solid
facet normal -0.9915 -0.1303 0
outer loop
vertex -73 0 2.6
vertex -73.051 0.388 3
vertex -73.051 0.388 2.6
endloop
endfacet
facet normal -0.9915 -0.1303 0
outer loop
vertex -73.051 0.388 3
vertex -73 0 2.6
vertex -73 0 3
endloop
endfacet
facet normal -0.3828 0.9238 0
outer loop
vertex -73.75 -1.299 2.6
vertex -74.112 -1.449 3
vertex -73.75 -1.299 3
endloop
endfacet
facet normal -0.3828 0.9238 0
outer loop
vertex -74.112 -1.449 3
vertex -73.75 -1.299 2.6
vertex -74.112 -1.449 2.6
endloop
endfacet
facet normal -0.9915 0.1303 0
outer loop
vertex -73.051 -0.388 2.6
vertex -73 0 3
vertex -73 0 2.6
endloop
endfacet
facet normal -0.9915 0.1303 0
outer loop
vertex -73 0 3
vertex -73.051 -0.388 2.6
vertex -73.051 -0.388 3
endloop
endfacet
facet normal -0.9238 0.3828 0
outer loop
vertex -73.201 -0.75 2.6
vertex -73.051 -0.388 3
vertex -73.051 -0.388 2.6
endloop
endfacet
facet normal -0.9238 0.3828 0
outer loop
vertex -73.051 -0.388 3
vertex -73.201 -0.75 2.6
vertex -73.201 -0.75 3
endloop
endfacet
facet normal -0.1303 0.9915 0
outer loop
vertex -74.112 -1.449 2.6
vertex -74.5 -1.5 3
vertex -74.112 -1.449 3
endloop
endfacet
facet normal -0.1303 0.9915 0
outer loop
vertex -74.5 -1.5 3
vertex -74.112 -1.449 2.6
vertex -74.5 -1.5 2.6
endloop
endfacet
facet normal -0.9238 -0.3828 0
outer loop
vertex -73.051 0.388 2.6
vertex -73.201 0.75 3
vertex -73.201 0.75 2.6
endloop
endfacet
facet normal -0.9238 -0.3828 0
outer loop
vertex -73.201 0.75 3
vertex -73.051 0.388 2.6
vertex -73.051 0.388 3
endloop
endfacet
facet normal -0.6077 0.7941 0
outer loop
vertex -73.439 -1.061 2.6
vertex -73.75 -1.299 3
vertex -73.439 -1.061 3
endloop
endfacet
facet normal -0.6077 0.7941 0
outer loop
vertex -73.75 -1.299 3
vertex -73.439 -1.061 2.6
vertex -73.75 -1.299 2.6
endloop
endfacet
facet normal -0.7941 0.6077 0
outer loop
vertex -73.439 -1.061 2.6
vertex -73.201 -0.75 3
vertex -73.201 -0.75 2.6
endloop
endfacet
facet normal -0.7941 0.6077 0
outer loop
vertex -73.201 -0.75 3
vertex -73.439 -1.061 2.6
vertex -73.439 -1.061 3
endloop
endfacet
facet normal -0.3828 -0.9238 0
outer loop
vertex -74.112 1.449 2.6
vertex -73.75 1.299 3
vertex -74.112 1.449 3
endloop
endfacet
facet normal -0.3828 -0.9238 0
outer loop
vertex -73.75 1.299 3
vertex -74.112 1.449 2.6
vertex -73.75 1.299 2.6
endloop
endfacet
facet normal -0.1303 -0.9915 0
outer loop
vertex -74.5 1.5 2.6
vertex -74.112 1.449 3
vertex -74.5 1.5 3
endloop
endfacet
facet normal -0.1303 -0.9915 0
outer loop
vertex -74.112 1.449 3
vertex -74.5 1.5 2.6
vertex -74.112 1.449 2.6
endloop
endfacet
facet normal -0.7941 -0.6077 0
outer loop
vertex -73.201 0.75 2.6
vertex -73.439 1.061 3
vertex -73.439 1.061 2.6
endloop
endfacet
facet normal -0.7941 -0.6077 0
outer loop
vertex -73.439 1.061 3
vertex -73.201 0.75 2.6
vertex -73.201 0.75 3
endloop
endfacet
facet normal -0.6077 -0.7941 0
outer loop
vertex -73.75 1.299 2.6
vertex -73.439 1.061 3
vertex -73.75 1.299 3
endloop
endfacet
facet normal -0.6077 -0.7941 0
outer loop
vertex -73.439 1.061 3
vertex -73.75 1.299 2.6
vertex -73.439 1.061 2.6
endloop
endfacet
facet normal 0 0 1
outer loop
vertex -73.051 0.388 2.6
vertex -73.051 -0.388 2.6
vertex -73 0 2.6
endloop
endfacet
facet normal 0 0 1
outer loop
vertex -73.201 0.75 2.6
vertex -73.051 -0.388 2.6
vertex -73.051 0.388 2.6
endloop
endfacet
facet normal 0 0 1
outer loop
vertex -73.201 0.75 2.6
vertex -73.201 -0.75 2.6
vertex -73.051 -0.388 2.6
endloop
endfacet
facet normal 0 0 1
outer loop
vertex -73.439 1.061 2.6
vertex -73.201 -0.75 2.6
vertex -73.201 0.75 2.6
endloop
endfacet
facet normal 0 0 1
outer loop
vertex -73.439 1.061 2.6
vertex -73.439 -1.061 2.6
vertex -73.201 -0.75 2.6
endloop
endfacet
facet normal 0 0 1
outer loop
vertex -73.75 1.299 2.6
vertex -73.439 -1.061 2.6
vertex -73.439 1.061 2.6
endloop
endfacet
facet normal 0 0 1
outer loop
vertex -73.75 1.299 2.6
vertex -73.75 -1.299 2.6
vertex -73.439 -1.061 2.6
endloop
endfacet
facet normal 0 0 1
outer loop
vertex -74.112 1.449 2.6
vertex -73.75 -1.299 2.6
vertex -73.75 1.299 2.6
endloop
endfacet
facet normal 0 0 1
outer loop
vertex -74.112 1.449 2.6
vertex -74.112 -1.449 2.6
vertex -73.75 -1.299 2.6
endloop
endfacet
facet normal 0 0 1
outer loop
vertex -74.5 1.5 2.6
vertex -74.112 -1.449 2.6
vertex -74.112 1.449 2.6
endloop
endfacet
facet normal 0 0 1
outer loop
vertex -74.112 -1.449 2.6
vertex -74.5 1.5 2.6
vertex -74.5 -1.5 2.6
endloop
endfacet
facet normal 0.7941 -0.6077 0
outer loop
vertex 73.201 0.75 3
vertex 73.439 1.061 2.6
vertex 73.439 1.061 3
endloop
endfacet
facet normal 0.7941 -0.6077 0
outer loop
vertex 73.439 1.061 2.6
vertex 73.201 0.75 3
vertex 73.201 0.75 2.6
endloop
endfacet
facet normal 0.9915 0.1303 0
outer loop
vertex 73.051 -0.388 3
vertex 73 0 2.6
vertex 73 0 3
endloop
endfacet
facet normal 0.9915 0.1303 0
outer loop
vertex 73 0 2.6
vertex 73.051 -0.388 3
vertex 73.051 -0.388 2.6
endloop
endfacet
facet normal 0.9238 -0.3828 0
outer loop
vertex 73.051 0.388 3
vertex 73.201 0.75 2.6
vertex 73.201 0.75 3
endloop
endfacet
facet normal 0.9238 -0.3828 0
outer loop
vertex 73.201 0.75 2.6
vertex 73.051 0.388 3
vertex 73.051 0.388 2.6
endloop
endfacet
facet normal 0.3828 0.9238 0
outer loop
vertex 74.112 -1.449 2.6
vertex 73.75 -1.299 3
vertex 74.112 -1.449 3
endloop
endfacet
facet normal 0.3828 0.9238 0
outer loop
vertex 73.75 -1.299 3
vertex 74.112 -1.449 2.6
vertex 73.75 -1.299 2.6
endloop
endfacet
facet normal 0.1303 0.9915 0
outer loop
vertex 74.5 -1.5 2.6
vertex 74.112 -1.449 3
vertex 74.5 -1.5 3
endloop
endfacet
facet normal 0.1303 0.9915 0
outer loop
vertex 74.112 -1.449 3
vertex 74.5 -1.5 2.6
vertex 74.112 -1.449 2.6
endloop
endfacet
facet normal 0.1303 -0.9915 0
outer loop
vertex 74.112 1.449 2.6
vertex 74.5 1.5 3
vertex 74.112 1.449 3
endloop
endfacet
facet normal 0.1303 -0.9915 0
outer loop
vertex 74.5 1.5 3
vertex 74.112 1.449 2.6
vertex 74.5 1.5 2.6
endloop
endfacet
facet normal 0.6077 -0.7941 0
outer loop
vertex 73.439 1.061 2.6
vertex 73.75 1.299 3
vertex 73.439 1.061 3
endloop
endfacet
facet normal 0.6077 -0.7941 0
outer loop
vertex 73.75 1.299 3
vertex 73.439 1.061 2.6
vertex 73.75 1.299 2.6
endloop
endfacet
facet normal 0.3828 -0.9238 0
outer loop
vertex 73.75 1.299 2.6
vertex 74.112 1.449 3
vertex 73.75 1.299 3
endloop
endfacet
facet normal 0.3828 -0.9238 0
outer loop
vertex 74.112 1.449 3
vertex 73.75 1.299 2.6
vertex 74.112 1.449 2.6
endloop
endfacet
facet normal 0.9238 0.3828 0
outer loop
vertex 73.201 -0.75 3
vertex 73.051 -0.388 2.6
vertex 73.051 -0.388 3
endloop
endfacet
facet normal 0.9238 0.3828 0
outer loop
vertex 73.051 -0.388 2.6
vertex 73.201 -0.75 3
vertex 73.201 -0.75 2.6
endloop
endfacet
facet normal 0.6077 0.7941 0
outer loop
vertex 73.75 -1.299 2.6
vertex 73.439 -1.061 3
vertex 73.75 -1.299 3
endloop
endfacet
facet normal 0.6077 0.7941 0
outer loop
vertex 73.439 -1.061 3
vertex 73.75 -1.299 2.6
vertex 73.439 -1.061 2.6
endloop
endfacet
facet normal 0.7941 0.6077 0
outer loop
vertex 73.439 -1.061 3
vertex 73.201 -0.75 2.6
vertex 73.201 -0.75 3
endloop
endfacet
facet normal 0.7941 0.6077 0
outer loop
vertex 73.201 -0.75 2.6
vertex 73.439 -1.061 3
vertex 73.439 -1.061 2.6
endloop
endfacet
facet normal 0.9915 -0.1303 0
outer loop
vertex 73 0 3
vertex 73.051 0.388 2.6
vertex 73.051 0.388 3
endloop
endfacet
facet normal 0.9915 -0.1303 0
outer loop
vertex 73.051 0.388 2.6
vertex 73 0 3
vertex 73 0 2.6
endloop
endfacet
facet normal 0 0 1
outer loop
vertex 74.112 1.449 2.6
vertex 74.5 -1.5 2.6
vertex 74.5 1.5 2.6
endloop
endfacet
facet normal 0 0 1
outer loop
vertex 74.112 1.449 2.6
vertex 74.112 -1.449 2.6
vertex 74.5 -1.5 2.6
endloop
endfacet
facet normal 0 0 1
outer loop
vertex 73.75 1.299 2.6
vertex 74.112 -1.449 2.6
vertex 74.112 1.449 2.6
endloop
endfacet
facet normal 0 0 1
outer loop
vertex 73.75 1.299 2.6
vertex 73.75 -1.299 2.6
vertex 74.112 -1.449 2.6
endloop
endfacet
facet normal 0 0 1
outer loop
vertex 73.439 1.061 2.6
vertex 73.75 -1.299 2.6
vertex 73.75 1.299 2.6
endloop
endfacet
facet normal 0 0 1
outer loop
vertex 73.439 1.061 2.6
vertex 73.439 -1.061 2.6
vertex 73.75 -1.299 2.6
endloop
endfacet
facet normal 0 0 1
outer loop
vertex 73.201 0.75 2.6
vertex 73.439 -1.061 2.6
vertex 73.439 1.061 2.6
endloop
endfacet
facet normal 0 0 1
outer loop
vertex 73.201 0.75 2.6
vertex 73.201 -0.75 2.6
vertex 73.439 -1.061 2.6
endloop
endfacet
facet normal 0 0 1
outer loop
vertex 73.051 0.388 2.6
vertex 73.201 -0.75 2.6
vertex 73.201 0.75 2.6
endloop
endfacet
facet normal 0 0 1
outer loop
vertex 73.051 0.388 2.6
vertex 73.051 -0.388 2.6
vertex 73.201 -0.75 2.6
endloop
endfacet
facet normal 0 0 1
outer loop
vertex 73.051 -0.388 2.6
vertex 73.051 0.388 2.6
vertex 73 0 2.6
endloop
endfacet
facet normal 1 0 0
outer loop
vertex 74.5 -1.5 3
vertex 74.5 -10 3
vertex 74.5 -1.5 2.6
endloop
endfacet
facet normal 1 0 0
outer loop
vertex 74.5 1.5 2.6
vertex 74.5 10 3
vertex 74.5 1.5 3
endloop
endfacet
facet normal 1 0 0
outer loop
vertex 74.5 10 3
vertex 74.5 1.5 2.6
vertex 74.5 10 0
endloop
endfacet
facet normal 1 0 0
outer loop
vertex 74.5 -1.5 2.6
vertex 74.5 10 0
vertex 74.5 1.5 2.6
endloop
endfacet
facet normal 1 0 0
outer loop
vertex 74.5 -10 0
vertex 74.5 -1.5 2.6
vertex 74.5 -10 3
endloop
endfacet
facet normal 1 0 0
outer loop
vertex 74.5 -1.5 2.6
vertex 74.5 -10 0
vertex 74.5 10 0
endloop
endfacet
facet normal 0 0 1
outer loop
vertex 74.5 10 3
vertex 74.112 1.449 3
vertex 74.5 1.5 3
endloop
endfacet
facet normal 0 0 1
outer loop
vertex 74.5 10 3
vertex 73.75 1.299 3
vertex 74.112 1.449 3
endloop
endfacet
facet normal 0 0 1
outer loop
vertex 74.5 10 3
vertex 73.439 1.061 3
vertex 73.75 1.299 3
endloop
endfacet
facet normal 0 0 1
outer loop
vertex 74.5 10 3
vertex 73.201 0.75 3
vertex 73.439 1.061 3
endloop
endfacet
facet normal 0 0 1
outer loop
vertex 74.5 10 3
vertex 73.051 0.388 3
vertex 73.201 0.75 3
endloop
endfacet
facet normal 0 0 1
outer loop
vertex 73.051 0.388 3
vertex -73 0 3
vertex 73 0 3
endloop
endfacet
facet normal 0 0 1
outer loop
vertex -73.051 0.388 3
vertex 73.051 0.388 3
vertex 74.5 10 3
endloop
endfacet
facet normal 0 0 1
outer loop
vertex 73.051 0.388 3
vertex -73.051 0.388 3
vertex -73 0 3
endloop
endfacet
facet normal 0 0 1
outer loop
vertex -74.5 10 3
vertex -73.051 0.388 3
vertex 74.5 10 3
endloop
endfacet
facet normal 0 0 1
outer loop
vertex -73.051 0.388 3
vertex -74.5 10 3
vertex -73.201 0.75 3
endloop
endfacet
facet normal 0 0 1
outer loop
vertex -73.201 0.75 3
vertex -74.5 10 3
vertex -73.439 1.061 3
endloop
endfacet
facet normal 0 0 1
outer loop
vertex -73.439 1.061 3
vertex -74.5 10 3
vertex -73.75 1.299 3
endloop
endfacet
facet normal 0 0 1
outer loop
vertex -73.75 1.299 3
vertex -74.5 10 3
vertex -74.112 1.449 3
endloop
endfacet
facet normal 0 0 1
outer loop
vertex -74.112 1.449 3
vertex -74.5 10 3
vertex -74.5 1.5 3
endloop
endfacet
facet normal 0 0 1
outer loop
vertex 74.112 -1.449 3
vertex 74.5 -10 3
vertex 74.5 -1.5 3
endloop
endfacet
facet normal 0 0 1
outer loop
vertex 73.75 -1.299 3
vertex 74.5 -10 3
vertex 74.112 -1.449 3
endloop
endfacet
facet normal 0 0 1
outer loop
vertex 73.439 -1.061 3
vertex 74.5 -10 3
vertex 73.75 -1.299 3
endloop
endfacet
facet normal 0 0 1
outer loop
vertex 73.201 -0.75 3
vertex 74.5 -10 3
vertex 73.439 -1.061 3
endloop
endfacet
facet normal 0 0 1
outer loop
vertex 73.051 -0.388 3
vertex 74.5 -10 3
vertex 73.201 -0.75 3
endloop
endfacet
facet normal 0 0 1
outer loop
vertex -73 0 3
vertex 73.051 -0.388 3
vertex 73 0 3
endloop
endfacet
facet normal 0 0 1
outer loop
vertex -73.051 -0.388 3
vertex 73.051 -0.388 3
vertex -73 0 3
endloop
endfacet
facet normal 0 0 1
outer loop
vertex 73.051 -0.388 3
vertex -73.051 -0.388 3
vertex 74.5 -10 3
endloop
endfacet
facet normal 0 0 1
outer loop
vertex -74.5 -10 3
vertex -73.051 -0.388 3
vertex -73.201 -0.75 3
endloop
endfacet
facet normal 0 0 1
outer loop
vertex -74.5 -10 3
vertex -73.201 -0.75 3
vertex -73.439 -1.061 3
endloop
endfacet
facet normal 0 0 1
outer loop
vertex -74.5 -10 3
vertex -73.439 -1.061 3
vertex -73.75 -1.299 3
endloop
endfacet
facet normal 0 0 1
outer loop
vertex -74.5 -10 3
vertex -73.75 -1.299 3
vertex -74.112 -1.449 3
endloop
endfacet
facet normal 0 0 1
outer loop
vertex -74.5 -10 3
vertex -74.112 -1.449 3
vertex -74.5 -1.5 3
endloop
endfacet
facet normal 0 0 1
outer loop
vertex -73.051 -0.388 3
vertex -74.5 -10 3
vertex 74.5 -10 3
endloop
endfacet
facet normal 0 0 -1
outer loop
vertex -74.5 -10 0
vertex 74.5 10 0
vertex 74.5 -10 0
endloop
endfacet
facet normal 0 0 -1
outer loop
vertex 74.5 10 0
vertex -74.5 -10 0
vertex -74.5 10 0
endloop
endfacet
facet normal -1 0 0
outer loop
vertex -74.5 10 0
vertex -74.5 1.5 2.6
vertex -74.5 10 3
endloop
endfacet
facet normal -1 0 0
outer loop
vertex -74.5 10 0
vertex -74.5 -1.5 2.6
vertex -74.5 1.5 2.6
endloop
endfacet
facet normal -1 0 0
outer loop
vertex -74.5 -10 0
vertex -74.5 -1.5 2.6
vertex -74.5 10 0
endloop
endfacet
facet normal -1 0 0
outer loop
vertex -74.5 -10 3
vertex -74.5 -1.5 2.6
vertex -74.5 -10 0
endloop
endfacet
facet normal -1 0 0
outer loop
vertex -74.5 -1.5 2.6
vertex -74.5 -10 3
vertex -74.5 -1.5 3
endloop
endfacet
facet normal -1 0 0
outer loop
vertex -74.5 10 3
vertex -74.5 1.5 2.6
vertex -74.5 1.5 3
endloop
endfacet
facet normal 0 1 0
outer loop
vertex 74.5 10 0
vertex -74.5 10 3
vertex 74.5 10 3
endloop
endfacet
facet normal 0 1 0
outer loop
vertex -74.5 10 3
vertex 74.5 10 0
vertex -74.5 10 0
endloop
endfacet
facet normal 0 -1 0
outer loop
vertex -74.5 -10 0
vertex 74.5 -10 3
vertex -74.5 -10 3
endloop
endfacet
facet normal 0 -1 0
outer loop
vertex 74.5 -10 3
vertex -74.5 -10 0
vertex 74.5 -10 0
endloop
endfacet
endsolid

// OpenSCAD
//
// ============================================================================
// SteamMachine UM790
// Project Phoenix
//
// Archivo  : probeta_ancho_panel.scad
// Versión  : 1.0
// Fecha    : 2026-08-16
// Autor    : Pep Ventura (asistido por Claude)
//
// PROBETA DE PRUEBA — no es una pieza del chasis. Sirve solo para
// validar la merma real de impresión antes de aplicar el cambio de
// ancho a los paneles definitivos (lower_panel.scad, nfc_panel.scad).
//
// CONTEXTO (2026-08-16): el usuario midió con regla el hueco interior
// real del chasis ya impreso (149mm) y el panel ya impreso (150mm,
// diseñado a 151mm) — el panel real queda MÁS ANCHO que el hueco
// real, no debería encajar bien. Propuesta: bajar el ancho de diseño
// a 149mm (con la misma merma de ~1mm ya observada, debería salir en
// ~148mm real, dejando 1mm de holgura total frente al hueco real de
// 149mm). Esta probeta sirve para confirmarlo ANTES de tocar los
// archivos definitivos.
//
// CÓMO USARLA: imprime esta pieza tal cual, luego:
//   1. Mide su ancho real con calibre — compáralo con los 149mm de
//      diseño para confirmar la merma real de esta impresión/material.
//   2. Pruébala directamente en el hueco del chasis (el rebaje
//      central, más estrecho, es del tamaño del marco lateral — deja
//      encajar la probeta igual que encajaría el borde de un panel
//      real). Si entra con una holgura razonable, el ancho de 149mm
//      es un buen valor para aplicar a los paneles de verdad.
//
// ============================================================================

test_width  = 149.0;  // el valor propuesto a validar
test_height = 20.0;   // ESTIMADO — alto suficiente para manejarla y medirla cómodamente
test_thickness = 3.0; // mismo grosor que los paneles reales (front_panel_thickness)

module probetaAnchoPanel()
{

    difference()
    {

        // Barra principal, al ancho a validar
        translate([-test_width/2, -test_height/2, 0])
            cube([test_width, test_height, test_thickness]);

        // Marcas de referencia grabadas en los dos extremos (0 y
        // 149mm), para poder verificar la medida real con calibre
        // sin ambigüedad sobre dónde empieza/acaba la pieza
        for(x=[-test_width/2, test_width/2])
            translate([x, 0, test_thickness-0.4])
                cylinder(r=1.5, h=0.5, $fn=24);

    }

}

probetaAnchoPanel();
